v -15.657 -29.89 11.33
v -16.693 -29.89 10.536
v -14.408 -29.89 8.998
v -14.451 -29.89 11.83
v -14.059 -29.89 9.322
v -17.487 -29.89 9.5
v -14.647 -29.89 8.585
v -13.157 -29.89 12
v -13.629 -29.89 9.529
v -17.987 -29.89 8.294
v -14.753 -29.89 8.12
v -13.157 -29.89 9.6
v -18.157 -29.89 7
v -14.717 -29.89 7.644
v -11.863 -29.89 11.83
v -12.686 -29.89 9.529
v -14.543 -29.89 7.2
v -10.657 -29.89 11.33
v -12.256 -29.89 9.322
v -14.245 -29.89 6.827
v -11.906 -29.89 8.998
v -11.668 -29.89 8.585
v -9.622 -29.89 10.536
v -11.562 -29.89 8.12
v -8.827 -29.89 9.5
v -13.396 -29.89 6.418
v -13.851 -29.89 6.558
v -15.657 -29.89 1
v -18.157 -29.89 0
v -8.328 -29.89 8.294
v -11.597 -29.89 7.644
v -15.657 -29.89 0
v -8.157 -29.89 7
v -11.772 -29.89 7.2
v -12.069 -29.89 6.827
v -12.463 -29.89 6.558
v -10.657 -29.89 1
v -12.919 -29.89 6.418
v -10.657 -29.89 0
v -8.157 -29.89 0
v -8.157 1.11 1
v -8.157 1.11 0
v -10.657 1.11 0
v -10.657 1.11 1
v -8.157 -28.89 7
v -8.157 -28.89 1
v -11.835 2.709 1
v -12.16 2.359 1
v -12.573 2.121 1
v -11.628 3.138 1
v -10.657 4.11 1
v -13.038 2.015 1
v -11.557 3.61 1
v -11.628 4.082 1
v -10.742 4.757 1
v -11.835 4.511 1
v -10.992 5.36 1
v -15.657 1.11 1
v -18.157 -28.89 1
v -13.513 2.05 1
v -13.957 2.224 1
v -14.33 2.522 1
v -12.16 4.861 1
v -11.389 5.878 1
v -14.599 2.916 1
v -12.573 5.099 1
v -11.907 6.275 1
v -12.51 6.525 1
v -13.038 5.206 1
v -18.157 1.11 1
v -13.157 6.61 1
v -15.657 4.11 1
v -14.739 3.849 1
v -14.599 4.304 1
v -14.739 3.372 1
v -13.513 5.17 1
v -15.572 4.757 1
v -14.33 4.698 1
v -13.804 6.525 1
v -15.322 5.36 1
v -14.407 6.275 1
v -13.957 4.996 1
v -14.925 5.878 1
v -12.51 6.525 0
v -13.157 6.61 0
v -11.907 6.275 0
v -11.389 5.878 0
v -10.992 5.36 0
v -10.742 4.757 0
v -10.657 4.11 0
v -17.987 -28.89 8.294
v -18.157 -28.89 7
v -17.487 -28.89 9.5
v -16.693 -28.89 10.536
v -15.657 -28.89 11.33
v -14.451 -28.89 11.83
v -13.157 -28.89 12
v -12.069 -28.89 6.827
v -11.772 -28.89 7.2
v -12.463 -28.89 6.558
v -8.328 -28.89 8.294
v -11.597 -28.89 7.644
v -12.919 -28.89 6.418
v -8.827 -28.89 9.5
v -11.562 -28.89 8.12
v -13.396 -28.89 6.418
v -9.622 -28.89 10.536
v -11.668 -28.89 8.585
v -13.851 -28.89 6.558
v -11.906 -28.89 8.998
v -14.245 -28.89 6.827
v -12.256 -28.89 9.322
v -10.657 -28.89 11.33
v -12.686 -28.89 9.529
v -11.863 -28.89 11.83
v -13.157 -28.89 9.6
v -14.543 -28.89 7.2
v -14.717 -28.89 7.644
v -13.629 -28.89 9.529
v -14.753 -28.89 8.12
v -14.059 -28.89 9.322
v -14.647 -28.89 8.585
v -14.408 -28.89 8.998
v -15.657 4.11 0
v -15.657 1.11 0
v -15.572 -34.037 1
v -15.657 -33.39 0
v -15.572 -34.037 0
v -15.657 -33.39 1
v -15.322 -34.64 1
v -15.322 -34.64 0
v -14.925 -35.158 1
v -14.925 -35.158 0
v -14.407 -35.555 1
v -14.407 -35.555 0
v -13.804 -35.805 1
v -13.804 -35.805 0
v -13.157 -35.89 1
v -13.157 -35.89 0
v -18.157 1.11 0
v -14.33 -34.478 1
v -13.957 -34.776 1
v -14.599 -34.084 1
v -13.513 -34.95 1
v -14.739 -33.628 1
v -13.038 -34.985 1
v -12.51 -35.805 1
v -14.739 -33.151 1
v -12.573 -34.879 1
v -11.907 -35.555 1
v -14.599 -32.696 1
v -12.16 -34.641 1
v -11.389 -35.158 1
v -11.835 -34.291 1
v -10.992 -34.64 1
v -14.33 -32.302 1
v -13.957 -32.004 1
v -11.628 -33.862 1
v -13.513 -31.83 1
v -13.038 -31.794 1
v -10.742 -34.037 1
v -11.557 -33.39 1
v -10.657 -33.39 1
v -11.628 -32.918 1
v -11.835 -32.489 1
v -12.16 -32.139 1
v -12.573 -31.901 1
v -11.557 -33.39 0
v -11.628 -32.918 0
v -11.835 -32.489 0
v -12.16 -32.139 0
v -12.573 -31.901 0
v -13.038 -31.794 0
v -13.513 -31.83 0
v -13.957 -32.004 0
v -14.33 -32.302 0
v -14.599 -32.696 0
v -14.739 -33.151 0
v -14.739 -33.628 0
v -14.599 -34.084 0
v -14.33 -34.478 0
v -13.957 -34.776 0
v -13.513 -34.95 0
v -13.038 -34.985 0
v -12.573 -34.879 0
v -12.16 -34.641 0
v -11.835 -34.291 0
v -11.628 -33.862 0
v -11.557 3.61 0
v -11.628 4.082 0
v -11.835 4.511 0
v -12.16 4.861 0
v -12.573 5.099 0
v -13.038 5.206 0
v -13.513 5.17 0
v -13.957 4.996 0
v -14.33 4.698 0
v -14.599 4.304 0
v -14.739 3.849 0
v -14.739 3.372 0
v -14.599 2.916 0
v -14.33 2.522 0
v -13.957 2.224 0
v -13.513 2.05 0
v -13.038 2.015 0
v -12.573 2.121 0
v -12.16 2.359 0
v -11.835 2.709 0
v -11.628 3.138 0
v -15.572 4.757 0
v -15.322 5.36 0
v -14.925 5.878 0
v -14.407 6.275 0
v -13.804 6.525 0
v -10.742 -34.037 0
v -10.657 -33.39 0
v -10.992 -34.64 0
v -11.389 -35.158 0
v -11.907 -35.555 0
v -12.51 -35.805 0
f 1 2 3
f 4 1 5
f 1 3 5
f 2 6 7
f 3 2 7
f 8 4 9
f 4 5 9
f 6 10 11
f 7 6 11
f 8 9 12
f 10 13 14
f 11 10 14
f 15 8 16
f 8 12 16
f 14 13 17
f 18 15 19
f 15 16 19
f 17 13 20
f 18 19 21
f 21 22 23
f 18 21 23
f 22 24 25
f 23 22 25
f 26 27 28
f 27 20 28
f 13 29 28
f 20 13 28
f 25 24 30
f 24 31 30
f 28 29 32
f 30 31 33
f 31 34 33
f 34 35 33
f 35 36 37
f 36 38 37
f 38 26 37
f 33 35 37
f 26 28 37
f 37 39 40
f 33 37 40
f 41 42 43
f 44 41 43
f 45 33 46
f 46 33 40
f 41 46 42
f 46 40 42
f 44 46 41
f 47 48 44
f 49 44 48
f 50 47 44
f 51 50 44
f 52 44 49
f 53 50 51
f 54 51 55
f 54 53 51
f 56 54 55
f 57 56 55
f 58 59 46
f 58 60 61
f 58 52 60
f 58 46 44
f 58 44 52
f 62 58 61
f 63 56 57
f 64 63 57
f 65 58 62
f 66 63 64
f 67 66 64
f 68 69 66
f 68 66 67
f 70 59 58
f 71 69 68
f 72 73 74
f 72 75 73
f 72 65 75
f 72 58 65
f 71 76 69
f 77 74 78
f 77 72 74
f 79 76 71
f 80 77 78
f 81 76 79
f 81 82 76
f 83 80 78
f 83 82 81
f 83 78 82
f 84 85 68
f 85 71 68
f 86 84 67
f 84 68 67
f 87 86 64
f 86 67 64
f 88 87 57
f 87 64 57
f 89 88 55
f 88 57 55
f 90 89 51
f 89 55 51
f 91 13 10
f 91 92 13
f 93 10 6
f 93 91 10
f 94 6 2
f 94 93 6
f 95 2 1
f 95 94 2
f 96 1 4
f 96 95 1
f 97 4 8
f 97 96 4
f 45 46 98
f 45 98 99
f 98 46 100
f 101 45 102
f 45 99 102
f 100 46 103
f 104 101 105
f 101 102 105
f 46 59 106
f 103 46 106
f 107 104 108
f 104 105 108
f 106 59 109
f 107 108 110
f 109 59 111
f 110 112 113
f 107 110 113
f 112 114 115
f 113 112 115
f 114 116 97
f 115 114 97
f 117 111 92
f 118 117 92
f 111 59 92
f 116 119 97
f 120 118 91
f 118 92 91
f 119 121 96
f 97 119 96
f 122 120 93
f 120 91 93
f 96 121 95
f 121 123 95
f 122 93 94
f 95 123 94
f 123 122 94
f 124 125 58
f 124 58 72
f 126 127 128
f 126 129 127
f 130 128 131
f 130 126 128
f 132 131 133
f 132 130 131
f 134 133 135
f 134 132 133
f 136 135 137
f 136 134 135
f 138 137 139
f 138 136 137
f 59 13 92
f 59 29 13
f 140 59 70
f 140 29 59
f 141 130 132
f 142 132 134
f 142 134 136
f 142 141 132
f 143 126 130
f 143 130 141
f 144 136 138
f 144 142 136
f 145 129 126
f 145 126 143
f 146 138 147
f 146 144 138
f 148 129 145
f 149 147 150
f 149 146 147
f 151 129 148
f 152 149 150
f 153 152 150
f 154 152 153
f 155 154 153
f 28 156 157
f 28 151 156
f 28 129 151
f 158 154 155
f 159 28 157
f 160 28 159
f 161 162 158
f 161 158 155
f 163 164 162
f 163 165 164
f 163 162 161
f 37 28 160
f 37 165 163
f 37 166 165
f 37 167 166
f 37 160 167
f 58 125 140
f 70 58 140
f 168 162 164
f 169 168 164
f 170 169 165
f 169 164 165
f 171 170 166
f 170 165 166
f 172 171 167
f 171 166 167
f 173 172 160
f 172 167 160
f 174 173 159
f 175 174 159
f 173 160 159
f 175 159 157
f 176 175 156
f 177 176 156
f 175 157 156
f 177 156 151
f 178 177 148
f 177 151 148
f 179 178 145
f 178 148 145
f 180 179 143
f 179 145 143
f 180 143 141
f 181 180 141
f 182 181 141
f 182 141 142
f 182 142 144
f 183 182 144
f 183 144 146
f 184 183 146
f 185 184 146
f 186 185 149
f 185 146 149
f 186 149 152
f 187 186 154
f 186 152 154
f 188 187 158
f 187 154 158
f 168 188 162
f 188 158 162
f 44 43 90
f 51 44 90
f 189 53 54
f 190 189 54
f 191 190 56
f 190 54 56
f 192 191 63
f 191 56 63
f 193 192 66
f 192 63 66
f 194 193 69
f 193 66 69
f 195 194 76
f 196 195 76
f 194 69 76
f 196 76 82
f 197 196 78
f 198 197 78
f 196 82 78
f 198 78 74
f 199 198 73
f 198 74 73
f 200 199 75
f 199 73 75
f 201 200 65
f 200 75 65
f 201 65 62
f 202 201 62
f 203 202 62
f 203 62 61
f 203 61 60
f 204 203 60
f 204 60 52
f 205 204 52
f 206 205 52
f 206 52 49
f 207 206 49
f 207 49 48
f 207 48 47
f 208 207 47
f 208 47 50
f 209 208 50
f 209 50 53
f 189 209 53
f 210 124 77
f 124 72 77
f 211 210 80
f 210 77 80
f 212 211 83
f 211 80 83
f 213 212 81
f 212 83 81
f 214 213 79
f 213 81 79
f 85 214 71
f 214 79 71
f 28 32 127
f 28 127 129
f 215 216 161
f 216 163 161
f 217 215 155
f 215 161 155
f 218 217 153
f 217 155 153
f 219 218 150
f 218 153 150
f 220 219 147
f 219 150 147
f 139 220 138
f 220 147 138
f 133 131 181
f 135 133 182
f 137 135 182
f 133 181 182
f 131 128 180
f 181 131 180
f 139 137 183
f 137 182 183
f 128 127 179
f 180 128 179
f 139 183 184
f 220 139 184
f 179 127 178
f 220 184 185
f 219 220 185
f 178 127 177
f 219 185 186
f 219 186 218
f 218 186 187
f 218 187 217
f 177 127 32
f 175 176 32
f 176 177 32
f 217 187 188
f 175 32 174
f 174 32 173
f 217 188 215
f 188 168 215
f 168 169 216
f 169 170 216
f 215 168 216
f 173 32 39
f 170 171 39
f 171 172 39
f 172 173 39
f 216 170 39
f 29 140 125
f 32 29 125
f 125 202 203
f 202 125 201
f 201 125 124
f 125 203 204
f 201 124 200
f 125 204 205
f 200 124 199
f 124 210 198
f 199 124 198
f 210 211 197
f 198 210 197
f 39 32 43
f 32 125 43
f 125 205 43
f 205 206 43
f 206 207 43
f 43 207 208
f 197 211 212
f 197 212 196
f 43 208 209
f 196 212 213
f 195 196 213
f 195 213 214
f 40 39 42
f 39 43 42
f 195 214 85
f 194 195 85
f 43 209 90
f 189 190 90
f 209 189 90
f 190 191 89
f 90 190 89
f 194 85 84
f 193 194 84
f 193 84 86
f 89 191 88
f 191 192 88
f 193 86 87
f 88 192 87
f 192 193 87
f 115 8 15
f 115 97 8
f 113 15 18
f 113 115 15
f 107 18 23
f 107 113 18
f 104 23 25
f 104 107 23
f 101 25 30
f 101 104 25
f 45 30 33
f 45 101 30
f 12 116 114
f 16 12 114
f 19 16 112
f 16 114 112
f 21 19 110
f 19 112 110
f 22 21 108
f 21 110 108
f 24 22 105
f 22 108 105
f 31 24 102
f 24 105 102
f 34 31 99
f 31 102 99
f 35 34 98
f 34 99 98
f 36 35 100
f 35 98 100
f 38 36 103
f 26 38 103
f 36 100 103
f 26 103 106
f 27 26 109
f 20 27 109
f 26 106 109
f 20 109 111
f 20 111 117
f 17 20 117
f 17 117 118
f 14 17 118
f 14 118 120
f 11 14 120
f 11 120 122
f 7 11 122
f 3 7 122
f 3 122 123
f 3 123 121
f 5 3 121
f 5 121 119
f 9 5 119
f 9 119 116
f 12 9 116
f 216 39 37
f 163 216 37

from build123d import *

# Parameters (mm, degrees)
SKETCH1_W           = 10
SKETCH1_H           = 36.5
BOSS_EXTRUDE1_DEPTH = 12
SKETCH2_W           = 11
SKETCH2_H           = 35.5
CUT_EXTRUDE1_DEPTH  = 34.725476075
SKETCH3_R           = 1.6
CUT_EXTRUDE2_DEPTH  = 16.77
SKETCH4_R           = 1.6
CUT_EXTRUDE4_DEPTH  = 16.77
FILLET1_R           = 5
FILLET2_R           = 5
SKETCH8_W           = 5
SKETCH8_H           = 1
BOSS_EXTRUDE2_DEPTH = 6
FILLET6_R           = 2.5
SKETCH9_R           = 1.6
CUT_EXTRUDE6_DEPTH  = 1
SKETCH10_W          = 2.5
SKETCH10_H          = 5.5
CUT_EXTRUDE7_DEPTH  = 1
FILLET7_R           = 2.5


with BuildPart() as part:
    # Sketch1 → Boss-Extrude1 (new body)
    with BuildSketch(Plane.XY):
        with Locations((-13.157195709, -11.639927007)):
            Rectangle(SKETCH1_W, SKETCH1_H)
    extrude(amount=BOSS_EXTRUDE1_DEPTH)

    # Sketch2 → Cut-Extrude1 (cut, through all)
    with BuildSketch(Plane.ZY.offset(18.157195709)):
        with Locations((6.5, -11.139927007)):
            Rectangle(SKETCH2_W, SKETCH2_H)
    extrude(amount=-CUT_EXTRUDE1_DEPTH, mode=Mode.SUBTRACT)

    # Sketch3 → Cut-Extrude2 (cut)
    with BuildSketch(Plane.XY.offset(1)):
        with Locations((-13.157195709, 3.610072993)):
            Circle(SKETCH3_R)
    extrude(amount=-CUT_EXTRUDE2_DEPTH, mode=Mode.SUBTRACT)

    # Sketch4 → Cut-Extrude4 (cut)
    with BuildSketch(Plane(origin=(0, -28.889927007, 0), x_dir=(1, 0, 0), z_dir=(0, 1, 0))):
        with Locations(Location((-13.157195709, -8, 0), (0, 0, 270))):
            Circle(SKETCH4_R)
    extrude(amount=-CUT_EXTRUDE4_DEPTH, mode=Mode.SUBTRACT)

    # Fillet1
    fillet1_edges = [part.edges().sort_by_distance(p)[0] for p in [
        (-18.157195709, -29.389927007, 12),
    ]]
    fillet(fillet1_edges, radius=FILLET1_R)

    # Fillet2
    fillet2_edges = [part.edges().sort_by_distance(p)[0] for p in [
        (-8.157195709, -29.389927007, 12),
    ]]
    fillet(fillet2_edges, radius=FILLET2_R - 0.0001)  # a hair under: the kernel refuses the full size

    # Sketch8 → Boss-Extrude2 (add)
    with BuildSketch(Plane.XZ.offset(29.889927007)):
        with Locations((-13.157195709, 0.5)):
            Rectangle(SKETCH8_W, SKETCH8_H)
    extrude(amount=BOSS_EXTRUDE2_DEPTH)

    # Fillet6
    fillet6_edges = [part.edges().sort_by_distance(p)[0] for p in [
        (-15.657195709, -35.889927007, 0.5),
        (-10.657195709, -35.889927007, 0.5),
    ]]
    fillet(fillet6_edges, radius=FILLET6_R - 0.0001)  # a hair under: the kernel refuses the full size

    # Sketch9 → Cut-Extrude6 (cut)
    with BuildSketch(Plane.XY.offset(1)):
        with Locations((-13.157195709, -33.389927007)):
            Circle(SKETCH9_R)
    extrude(amount=-CUT_EXTRUDE6_DEPTH, mode=Mode.SUBTRACT)

    # Sketch10 → Cut-Extrude7 (cut)
    with BuildSketch(Plane(origin=(0, 0, 0), x_dir=(-1, 0, 0), z_dir=(0, 0, -1))):
        with Locations((9.407195709, 3.860072993)):
            Rectangle(SKETCH10_W, SKETCH10_H)
        with Locations((16.907195709, 3.860072993)):
            Rectangle(SKETCH10_W, SKETCH10_H)
    extrude(amount=-CUT_EXTRUDE7_DEPTH, mode=Mode.SUBTRACT)

    # Fillet7
    fillet7_edges = [part.edges().sort_by_distance(p)[0] for p in [
        (-10.657195709, 6.610072993, 0.5),
        (-15.657195709, 6.610072993, 0.5),
    ]]
    fillet(fillet7_edges, radius=FILLET7_R - 0.0001)  # a hair under: the kernel refuses the full size


solid = part.part
